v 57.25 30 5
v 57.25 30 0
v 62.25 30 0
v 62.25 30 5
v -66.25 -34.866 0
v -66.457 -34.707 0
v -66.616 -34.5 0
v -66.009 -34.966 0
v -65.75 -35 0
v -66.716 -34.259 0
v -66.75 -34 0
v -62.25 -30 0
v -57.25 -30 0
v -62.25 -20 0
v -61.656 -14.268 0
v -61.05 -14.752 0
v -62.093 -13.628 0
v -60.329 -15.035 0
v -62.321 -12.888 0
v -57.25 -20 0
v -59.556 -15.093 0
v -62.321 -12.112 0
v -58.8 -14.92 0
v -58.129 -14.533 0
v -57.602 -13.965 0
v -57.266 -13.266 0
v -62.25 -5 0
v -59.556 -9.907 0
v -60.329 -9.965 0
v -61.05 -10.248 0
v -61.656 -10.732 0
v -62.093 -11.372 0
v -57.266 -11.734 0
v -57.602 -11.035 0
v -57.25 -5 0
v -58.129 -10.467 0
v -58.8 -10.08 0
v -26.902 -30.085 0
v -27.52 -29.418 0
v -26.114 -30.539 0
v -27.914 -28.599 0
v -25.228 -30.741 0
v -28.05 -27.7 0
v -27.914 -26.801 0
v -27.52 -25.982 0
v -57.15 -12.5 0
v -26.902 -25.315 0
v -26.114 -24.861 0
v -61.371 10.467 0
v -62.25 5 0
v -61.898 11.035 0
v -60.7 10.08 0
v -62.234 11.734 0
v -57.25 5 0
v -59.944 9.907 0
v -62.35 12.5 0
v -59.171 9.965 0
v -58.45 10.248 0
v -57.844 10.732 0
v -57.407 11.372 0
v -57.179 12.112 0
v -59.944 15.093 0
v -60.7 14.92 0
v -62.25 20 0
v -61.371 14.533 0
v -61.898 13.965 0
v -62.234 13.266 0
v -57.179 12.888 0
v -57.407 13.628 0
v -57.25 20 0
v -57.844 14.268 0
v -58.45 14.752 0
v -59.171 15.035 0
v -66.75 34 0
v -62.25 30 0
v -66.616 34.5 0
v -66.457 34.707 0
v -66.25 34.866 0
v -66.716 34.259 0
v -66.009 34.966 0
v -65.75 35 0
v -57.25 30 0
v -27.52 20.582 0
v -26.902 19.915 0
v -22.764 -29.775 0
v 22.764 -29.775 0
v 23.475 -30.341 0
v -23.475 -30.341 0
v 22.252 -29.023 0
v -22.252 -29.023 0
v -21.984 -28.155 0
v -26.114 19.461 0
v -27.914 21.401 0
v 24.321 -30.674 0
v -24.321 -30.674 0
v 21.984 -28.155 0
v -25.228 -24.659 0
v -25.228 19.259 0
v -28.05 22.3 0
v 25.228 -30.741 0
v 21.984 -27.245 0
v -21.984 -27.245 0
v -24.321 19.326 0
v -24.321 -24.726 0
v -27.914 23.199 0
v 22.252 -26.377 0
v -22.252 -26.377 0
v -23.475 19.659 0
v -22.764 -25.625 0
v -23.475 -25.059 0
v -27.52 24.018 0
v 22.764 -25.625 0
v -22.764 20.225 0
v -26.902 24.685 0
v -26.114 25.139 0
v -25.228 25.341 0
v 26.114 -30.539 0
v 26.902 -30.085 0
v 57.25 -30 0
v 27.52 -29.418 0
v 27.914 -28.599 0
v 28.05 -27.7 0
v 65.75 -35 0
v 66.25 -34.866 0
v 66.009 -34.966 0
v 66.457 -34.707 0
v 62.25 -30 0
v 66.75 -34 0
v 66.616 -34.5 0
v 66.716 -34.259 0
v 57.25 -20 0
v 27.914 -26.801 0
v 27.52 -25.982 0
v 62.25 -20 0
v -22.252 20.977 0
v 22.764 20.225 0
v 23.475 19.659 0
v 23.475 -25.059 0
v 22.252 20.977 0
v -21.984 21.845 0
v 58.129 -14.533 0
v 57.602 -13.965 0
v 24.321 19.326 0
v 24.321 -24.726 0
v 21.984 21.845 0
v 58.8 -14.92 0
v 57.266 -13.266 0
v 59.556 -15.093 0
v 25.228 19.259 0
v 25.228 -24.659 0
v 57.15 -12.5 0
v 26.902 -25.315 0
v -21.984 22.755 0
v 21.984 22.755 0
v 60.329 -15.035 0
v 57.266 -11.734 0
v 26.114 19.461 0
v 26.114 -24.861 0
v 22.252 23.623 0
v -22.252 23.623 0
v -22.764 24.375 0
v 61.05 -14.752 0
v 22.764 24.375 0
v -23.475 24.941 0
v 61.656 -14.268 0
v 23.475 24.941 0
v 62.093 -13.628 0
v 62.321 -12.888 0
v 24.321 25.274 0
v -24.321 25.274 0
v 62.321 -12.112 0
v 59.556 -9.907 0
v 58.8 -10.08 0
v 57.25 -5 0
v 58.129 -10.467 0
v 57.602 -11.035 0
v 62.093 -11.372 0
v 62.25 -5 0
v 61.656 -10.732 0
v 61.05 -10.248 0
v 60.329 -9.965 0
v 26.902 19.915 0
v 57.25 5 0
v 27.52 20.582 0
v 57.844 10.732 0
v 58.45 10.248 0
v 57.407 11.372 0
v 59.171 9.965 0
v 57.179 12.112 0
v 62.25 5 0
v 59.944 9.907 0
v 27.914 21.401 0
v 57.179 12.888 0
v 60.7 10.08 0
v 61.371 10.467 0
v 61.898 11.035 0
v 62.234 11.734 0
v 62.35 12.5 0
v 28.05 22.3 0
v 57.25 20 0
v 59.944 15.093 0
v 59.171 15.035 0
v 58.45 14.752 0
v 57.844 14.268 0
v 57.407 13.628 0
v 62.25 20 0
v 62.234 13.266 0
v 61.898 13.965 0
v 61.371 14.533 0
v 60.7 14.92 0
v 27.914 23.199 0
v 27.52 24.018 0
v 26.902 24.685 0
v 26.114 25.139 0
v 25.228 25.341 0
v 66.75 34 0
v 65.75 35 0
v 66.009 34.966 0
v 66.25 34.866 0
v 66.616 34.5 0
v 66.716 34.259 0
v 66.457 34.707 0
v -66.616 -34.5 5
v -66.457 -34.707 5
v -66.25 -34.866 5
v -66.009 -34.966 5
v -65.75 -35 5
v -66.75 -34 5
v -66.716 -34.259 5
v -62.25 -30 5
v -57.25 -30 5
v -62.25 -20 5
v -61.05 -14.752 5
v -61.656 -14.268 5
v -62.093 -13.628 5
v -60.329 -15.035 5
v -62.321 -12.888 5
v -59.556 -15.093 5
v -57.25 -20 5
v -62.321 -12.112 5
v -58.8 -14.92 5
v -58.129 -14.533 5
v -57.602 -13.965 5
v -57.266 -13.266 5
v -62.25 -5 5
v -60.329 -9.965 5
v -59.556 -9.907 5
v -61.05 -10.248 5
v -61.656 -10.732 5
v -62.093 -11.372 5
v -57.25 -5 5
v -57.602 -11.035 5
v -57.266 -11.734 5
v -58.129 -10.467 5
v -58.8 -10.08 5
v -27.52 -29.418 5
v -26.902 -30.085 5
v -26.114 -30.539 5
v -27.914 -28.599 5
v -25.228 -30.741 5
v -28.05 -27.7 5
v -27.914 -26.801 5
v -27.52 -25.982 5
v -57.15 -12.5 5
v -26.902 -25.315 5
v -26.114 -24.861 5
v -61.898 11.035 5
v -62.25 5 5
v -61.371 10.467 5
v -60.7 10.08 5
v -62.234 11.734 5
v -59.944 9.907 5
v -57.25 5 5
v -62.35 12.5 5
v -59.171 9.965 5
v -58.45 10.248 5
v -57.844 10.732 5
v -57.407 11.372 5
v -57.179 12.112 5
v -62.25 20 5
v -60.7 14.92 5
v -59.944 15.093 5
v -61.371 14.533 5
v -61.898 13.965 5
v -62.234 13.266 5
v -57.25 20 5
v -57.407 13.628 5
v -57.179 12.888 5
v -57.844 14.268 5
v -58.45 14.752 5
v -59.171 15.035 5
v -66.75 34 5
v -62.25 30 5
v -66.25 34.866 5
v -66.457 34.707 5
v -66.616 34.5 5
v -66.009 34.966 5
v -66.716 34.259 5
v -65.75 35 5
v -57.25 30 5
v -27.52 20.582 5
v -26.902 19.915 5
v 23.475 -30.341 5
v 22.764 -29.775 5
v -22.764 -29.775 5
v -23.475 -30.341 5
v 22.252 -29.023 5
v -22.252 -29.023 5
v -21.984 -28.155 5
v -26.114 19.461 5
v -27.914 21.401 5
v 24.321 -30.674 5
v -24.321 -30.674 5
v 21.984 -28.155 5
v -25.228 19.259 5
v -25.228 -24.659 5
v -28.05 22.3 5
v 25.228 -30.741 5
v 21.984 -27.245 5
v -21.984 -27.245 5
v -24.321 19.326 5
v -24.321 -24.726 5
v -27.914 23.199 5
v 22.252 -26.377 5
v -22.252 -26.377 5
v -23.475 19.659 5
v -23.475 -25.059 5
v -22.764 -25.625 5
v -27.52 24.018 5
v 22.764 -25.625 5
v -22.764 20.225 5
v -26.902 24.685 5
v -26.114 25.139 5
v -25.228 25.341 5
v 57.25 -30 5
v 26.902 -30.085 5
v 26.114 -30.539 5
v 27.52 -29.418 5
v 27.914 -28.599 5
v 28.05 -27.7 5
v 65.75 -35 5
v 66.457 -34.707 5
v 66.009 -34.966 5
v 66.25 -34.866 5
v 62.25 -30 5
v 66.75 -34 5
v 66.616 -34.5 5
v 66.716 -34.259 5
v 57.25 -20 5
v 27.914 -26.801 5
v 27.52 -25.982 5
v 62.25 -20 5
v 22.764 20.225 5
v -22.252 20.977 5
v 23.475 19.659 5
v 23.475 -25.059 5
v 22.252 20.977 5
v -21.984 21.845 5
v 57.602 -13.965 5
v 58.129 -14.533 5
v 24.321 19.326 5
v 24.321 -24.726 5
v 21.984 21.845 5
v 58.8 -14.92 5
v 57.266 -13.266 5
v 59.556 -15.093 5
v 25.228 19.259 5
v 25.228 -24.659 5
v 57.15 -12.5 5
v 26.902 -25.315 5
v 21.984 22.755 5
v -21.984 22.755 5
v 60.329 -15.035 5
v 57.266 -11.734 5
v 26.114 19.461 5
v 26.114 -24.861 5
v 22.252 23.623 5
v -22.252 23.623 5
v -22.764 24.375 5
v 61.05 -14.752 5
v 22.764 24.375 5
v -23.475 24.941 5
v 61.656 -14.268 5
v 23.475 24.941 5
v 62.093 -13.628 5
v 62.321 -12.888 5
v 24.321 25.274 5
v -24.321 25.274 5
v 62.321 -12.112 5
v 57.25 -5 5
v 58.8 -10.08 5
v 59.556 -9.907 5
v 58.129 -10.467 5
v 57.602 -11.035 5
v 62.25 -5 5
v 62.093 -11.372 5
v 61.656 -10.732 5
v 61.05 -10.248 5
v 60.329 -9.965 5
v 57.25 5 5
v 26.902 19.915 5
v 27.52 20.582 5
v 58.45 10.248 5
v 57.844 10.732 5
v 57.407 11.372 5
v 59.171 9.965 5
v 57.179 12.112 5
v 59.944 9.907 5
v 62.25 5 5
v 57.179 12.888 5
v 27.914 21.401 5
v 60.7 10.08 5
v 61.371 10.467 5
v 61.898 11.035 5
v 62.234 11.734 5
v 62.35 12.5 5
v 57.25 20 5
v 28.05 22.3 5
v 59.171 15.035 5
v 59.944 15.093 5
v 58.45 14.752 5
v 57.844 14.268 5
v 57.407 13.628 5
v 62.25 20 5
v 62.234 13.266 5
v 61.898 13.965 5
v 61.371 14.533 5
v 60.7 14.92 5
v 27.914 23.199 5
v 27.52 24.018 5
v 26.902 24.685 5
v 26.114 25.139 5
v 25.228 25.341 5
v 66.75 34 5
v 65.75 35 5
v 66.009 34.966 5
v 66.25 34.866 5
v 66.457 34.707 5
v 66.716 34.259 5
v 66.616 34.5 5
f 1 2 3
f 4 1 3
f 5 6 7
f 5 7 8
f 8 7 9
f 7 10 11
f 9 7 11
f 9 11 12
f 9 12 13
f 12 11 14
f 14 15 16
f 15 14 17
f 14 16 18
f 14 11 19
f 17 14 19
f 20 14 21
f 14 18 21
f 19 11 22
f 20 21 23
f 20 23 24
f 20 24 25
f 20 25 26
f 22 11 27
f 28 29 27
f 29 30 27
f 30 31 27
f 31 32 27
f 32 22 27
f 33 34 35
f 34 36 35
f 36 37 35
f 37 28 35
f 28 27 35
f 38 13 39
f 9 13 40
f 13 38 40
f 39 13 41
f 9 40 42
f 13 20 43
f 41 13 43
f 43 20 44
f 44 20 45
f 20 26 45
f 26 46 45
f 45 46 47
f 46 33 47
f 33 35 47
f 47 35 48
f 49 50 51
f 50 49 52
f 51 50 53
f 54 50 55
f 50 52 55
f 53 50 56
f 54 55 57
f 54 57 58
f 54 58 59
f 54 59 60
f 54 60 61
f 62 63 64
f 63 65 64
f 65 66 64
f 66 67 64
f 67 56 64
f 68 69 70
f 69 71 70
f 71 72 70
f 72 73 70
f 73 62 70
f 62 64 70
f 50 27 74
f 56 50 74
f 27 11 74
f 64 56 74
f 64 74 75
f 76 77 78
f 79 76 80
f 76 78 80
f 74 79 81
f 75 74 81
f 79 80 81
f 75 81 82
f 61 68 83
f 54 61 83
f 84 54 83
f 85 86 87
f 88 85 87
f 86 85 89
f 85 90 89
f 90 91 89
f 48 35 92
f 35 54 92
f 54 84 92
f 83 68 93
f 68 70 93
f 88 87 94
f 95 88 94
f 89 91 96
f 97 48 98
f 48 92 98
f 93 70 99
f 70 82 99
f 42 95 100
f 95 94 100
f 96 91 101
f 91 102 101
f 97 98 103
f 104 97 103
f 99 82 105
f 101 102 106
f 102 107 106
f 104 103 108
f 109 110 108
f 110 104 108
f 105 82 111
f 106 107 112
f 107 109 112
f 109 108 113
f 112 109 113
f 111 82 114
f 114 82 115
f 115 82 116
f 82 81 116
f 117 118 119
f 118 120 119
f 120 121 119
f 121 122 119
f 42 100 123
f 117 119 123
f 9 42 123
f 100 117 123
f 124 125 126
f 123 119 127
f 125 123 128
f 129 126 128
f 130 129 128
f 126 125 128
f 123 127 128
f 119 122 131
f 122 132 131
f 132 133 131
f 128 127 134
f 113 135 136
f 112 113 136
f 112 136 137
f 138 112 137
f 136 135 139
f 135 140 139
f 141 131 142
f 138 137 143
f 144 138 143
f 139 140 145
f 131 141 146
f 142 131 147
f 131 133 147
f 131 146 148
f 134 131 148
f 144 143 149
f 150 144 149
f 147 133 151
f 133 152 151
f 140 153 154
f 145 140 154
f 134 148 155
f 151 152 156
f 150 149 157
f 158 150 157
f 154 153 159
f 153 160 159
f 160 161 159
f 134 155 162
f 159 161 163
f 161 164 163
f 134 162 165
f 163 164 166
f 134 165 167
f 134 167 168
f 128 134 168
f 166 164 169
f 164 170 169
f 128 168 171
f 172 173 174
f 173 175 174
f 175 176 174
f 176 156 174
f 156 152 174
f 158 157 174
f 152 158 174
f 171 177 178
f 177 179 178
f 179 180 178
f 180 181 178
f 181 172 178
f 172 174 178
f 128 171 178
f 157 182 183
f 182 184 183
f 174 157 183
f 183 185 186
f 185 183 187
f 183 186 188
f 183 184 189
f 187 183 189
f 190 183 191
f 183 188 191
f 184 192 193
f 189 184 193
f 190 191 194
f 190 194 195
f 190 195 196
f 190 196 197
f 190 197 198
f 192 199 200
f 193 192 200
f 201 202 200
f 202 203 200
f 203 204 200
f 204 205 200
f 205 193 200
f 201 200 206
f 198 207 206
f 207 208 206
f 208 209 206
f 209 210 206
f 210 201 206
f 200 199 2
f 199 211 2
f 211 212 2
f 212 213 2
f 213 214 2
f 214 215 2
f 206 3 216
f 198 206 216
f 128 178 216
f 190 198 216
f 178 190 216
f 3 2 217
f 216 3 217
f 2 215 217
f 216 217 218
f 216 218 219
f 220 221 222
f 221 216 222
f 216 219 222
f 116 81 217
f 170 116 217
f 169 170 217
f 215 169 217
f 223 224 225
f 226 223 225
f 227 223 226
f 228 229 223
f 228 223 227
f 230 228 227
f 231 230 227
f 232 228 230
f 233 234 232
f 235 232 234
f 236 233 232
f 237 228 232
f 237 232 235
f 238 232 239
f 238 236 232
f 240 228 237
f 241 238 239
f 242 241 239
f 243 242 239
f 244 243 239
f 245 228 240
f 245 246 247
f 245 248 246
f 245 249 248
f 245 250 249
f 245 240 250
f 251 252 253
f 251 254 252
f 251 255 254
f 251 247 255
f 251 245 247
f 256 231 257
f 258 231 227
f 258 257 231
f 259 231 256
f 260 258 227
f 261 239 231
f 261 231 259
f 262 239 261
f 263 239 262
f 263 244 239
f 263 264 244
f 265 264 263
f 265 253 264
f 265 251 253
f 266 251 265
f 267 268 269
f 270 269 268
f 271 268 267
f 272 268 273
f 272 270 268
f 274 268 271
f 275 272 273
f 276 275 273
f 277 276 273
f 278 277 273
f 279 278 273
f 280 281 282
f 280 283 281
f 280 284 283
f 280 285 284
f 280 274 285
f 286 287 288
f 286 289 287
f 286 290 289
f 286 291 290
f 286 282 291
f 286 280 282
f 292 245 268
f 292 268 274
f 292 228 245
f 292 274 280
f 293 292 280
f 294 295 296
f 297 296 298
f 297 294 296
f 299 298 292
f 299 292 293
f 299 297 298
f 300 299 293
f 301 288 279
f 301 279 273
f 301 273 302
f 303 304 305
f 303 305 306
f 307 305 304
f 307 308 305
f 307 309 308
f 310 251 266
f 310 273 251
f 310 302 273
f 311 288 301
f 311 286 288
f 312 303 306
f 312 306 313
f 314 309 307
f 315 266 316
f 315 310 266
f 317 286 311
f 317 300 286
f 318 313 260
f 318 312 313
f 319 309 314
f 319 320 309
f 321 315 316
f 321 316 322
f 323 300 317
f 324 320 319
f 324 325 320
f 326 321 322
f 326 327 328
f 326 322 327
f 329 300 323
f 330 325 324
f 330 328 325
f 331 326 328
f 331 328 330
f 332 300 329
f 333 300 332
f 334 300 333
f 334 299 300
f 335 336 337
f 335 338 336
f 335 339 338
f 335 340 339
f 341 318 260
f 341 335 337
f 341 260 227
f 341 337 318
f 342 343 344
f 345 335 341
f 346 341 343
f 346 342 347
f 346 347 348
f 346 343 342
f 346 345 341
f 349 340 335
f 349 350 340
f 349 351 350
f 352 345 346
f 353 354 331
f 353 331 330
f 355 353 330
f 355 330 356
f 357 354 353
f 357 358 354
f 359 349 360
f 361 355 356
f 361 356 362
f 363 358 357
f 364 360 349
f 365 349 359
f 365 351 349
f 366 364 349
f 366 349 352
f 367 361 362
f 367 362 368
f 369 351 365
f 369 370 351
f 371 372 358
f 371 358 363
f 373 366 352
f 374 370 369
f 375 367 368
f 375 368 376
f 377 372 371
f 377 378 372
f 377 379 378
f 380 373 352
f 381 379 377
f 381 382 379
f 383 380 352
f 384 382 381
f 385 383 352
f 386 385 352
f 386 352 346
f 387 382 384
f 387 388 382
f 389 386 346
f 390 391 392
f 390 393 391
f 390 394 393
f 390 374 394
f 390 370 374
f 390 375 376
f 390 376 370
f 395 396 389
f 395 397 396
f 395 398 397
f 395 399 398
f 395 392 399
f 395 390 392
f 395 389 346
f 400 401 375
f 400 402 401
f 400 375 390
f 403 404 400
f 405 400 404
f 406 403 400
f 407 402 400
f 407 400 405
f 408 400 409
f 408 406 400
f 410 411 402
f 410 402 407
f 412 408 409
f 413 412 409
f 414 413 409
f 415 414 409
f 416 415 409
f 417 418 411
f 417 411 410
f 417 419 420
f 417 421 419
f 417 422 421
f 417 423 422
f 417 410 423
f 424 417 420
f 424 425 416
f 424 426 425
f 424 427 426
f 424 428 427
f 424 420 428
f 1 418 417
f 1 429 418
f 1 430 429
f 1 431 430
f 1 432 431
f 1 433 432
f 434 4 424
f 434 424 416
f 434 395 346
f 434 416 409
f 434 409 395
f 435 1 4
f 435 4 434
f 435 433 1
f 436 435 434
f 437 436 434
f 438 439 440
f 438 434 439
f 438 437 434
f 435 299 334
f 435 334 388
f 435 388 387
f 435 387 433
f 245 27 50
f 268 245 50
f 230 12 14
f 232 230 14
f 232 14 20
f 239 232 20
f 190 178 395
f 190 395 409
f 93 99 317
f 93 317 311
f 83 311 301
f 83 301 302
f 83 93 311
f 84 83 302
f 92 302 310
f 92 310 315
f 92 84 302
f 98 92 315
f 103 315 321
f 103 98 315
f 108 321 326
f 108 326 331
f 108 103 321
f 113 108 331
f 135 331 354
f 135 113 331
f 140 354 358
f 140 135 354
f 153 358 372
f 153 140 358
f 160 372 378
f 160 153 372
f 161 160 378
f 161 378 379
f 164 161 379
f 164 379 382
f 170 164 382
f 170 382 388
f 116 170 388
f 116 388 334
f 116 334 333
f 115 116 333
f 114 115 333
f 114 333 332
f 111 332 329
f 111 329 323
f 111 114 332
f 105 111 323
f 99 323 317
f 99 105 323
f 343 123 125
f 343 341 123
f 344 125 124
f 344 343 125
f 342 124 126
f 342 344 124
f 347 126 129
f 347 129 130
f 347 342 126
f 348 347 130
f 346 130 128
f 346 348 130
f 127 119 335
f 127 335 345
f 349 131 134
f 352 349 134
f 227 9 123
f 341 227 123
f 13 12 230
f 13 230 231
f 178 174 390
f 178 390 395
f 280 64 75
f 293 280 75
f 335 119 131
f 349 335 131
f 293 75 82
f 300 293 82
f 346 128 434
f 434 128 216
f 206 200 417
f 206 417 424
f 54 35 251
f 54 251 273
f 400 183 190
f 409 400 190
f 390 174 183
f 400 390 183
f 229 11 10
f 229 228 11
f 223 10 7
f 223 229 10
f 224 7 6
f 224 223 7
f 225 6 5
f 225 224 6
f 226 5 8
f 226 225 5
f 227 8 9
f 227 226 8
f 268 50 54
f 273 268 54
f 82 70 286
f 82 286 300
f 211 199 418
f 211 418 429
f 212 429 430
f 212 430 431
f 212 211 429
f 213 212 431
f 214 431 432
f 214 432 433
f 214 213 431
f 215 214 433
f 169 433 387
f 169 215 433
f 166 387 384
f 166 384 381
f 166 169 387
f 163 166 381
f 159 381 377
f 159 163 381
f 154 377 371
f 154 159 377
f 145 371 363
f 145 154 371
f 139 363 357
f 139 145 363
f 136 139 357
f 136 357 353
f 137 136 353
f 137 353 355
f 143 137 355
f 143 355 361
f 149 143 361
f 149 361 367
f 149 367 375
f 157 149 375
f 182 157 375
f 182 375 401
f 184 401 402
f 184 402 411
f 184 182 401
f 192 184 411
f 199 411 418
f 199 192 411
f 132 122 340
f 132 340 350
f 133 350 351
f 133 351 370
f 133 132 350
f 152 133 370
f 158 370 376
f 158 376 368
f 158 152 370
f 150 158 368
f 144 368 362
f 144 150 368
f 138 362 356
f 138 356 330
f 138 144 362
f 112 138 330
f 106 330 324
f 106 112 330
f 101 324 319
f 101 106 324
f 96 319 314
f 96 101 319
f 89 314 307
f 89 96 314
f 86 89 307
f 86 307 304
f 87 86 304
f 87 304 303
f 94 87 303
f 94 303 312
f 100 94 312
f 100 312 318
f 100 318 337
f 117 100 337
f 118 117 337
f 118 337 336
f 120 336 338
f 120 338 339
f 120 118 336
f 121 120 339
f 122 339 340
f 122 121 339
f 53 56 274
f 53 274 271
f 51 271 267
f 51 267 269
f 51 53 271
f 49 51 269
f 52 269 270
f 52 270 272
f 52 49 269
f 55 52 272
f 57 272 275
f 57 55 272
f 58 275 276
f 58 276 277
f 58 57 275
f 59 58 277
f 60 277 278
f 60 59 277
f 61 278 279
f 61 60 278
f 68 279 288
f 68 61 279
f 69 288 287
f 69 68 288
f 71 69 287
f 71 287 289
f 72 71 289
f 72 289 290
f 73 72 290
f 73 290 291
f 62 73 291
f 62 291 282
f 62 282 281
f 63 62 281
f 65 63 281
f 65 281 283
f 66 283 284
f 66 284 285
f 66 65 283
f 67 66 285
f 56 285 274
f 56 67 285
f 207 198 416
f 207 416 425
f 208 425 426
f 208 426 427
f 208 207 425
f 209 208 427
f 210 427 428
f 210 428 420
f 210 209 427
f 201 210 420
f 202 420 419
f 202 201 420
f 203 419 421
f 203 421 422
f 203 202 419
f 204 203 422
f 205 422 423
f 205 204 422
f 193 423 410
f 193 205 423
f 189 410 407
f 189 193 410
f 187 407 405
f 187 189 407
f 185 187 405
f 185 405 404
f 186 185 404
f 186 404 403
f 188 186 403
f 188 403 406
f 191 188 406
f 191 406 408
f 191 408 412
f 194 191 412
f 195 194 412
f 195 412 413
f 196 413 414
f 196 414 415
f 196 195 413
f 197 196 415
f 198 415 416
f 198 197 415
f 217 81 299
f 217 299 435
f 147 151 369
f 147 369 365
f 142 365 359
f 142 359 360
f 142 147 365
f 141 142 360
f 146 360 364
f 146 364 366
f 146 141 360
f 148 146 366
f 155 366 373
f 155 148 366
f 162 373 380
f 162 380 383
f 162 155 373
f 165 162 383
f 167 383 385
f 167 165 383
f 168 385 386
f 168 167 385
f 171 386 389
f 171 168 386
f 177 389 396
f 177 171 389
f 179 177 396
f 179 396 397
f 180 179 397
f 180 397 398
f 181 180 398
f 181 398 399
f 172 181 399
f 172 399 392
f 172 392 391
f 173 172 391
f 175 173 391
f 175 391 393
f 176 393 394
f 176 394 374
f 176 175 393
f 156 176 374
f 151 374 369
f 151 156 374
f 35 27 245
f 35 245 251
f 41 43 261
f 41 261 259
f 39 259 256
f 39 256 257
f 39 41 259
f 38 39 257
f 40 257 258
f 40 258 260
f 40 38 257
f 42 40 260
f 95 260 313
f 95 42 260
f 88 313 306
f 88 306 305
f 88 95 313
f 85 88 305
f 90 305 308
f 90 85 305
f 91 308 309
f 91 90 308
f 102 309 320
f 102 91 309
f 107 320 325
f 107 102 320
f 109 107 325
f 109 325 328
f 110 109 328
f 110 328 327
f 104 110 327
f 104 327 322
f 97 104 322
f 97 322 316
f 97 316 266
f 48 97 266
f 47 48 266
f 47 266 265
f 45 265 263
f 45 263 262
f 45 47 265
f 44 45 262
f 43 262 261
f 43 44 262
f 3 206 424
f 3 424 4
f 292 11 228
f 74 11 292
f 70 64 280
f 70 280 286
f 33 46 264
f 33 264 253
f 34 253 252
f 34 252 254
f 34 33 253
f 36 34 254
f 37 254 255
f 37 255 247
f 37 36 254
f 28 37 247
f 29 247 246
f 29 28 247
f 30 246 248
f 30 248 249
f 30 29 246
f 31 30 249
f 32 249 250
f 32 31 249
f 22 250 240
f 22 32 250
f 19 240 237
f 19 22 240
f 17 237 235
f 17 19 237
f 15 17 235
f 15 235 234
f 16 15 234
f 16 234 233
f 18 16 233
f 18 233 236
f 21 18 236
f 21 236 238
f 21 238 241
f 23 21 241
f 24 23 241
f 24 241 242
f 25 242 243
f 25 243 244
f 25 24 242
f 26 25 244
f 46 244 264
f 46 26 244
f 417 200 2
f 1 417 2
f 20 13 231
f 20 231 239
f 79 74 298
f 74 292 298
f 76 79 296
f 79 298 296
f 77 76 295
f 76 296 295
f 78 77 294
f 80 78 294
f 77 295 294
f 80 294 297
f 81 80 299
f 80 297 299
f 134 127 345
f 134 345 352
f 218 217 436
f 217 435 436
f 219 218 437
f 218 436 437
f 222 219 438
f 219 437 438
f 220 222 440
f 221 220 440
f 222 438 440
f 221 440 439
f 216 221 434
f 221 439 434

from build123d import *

# Parameters (mm, degrees)
SKETCH1_W           = 133.5
SKETCH1_H           = 70
SKETCH1_R           = 3.05
SKETCH1_R_2         = 2.6
SKETCH1_W_2         = 5
SKETCH1_H_2         = 10
BOSS_EXTRUDE1_DEPTH = 5
FILLET1_R           = 1


with BuildPart() as part:
    # Sketch1 → Boss-Extrude1 (new body)
    with BuildSketch(Plane.XY):
        Rectangle(SKETCH1_W, SKETCH1_H)
        with Locations((25, 22.3)):
            Circle(SKETCH1_R, mode=Mode.SUBTRACT)
        with Locations(Location((-25, 22.3, 0), (0, 0, 180))):
            Circle(SKETCH1_R, mode=Mode.SUBTRACT)
        with Locations((-59.75, -12.5)):
            Circle(SKETCH1_R_2, mode=Mode.SUBTRACT)
        with Locations(Location((59.75, -12.5, 0), (0, 0, 180))):
            Circle(SKETCH1_R_2, mode=Mode.SUBTRACT)
        with Locations(Location((-59.75, 12.5, 0), (0, 0, 180))):
            Circle(SKETCH1_R_2, mode=Mode.SUBTRACT)
        with Locations((59.75, 12.5)):
            Circle(SKETCH1_R_2, mode=Mode.SUBTRACT)
        with Locations((25, -27.7)):
            Circle(SKETCH1_R, mode=Mode.SUBTRACT)
        with Locations(Location((-25, -27.7, 0), (0, 0, 180))):
            Circle(SKETCH1_R, mode=Mode.SUBTRACT)
        with Locations((-59.75, -25)):
            Rectangle(SKETCH1_W_2, SKETCH1_H_2, mode=Mode.SUBTRACT)
        with Locations((59.75, -25)):
            Rectangle(SKETCH1_W_2, SKETCH1_H_2, mode=Mode.SUBTRACT)
        with Locations((-59.75, 0)):
            Rectangle(SKETCH1_W_2, SKETCH1_H_2, mode=Mode.SUBTRACT)
        with Locations((59.75, 0)):
            Rectangle(SKETCH1_W_2, SKETCH1_H_2, mode=Mode.SUBTRACT)
        with Locations((-59.75, 25)):
            Rectangle(SKETCH1_W_2, SKETCH1_H_2, mode=Mode.SUBTRACT)
        with Locations((59.75, 25)):
            Rectangle(SKETCH1_W_2, SKETCH1_H_2, mode=Mode.SUBTRACT)
    extrude(amount=BOSS_EXTRUDE1_DEPTH)

    # Fillet1
    fillet1_edges = [part.edges().sort_by_distance(p)[0] for p in [
        (66.75, -35, 2.5),
        (-66.75, -35, 2.5),
        (-66.75, 35, 2.5),
        (66.75, 35, 2.5),
    ]]
    fillet(fillet1_edges, radius=FILLET1_R)


solid = part.part
